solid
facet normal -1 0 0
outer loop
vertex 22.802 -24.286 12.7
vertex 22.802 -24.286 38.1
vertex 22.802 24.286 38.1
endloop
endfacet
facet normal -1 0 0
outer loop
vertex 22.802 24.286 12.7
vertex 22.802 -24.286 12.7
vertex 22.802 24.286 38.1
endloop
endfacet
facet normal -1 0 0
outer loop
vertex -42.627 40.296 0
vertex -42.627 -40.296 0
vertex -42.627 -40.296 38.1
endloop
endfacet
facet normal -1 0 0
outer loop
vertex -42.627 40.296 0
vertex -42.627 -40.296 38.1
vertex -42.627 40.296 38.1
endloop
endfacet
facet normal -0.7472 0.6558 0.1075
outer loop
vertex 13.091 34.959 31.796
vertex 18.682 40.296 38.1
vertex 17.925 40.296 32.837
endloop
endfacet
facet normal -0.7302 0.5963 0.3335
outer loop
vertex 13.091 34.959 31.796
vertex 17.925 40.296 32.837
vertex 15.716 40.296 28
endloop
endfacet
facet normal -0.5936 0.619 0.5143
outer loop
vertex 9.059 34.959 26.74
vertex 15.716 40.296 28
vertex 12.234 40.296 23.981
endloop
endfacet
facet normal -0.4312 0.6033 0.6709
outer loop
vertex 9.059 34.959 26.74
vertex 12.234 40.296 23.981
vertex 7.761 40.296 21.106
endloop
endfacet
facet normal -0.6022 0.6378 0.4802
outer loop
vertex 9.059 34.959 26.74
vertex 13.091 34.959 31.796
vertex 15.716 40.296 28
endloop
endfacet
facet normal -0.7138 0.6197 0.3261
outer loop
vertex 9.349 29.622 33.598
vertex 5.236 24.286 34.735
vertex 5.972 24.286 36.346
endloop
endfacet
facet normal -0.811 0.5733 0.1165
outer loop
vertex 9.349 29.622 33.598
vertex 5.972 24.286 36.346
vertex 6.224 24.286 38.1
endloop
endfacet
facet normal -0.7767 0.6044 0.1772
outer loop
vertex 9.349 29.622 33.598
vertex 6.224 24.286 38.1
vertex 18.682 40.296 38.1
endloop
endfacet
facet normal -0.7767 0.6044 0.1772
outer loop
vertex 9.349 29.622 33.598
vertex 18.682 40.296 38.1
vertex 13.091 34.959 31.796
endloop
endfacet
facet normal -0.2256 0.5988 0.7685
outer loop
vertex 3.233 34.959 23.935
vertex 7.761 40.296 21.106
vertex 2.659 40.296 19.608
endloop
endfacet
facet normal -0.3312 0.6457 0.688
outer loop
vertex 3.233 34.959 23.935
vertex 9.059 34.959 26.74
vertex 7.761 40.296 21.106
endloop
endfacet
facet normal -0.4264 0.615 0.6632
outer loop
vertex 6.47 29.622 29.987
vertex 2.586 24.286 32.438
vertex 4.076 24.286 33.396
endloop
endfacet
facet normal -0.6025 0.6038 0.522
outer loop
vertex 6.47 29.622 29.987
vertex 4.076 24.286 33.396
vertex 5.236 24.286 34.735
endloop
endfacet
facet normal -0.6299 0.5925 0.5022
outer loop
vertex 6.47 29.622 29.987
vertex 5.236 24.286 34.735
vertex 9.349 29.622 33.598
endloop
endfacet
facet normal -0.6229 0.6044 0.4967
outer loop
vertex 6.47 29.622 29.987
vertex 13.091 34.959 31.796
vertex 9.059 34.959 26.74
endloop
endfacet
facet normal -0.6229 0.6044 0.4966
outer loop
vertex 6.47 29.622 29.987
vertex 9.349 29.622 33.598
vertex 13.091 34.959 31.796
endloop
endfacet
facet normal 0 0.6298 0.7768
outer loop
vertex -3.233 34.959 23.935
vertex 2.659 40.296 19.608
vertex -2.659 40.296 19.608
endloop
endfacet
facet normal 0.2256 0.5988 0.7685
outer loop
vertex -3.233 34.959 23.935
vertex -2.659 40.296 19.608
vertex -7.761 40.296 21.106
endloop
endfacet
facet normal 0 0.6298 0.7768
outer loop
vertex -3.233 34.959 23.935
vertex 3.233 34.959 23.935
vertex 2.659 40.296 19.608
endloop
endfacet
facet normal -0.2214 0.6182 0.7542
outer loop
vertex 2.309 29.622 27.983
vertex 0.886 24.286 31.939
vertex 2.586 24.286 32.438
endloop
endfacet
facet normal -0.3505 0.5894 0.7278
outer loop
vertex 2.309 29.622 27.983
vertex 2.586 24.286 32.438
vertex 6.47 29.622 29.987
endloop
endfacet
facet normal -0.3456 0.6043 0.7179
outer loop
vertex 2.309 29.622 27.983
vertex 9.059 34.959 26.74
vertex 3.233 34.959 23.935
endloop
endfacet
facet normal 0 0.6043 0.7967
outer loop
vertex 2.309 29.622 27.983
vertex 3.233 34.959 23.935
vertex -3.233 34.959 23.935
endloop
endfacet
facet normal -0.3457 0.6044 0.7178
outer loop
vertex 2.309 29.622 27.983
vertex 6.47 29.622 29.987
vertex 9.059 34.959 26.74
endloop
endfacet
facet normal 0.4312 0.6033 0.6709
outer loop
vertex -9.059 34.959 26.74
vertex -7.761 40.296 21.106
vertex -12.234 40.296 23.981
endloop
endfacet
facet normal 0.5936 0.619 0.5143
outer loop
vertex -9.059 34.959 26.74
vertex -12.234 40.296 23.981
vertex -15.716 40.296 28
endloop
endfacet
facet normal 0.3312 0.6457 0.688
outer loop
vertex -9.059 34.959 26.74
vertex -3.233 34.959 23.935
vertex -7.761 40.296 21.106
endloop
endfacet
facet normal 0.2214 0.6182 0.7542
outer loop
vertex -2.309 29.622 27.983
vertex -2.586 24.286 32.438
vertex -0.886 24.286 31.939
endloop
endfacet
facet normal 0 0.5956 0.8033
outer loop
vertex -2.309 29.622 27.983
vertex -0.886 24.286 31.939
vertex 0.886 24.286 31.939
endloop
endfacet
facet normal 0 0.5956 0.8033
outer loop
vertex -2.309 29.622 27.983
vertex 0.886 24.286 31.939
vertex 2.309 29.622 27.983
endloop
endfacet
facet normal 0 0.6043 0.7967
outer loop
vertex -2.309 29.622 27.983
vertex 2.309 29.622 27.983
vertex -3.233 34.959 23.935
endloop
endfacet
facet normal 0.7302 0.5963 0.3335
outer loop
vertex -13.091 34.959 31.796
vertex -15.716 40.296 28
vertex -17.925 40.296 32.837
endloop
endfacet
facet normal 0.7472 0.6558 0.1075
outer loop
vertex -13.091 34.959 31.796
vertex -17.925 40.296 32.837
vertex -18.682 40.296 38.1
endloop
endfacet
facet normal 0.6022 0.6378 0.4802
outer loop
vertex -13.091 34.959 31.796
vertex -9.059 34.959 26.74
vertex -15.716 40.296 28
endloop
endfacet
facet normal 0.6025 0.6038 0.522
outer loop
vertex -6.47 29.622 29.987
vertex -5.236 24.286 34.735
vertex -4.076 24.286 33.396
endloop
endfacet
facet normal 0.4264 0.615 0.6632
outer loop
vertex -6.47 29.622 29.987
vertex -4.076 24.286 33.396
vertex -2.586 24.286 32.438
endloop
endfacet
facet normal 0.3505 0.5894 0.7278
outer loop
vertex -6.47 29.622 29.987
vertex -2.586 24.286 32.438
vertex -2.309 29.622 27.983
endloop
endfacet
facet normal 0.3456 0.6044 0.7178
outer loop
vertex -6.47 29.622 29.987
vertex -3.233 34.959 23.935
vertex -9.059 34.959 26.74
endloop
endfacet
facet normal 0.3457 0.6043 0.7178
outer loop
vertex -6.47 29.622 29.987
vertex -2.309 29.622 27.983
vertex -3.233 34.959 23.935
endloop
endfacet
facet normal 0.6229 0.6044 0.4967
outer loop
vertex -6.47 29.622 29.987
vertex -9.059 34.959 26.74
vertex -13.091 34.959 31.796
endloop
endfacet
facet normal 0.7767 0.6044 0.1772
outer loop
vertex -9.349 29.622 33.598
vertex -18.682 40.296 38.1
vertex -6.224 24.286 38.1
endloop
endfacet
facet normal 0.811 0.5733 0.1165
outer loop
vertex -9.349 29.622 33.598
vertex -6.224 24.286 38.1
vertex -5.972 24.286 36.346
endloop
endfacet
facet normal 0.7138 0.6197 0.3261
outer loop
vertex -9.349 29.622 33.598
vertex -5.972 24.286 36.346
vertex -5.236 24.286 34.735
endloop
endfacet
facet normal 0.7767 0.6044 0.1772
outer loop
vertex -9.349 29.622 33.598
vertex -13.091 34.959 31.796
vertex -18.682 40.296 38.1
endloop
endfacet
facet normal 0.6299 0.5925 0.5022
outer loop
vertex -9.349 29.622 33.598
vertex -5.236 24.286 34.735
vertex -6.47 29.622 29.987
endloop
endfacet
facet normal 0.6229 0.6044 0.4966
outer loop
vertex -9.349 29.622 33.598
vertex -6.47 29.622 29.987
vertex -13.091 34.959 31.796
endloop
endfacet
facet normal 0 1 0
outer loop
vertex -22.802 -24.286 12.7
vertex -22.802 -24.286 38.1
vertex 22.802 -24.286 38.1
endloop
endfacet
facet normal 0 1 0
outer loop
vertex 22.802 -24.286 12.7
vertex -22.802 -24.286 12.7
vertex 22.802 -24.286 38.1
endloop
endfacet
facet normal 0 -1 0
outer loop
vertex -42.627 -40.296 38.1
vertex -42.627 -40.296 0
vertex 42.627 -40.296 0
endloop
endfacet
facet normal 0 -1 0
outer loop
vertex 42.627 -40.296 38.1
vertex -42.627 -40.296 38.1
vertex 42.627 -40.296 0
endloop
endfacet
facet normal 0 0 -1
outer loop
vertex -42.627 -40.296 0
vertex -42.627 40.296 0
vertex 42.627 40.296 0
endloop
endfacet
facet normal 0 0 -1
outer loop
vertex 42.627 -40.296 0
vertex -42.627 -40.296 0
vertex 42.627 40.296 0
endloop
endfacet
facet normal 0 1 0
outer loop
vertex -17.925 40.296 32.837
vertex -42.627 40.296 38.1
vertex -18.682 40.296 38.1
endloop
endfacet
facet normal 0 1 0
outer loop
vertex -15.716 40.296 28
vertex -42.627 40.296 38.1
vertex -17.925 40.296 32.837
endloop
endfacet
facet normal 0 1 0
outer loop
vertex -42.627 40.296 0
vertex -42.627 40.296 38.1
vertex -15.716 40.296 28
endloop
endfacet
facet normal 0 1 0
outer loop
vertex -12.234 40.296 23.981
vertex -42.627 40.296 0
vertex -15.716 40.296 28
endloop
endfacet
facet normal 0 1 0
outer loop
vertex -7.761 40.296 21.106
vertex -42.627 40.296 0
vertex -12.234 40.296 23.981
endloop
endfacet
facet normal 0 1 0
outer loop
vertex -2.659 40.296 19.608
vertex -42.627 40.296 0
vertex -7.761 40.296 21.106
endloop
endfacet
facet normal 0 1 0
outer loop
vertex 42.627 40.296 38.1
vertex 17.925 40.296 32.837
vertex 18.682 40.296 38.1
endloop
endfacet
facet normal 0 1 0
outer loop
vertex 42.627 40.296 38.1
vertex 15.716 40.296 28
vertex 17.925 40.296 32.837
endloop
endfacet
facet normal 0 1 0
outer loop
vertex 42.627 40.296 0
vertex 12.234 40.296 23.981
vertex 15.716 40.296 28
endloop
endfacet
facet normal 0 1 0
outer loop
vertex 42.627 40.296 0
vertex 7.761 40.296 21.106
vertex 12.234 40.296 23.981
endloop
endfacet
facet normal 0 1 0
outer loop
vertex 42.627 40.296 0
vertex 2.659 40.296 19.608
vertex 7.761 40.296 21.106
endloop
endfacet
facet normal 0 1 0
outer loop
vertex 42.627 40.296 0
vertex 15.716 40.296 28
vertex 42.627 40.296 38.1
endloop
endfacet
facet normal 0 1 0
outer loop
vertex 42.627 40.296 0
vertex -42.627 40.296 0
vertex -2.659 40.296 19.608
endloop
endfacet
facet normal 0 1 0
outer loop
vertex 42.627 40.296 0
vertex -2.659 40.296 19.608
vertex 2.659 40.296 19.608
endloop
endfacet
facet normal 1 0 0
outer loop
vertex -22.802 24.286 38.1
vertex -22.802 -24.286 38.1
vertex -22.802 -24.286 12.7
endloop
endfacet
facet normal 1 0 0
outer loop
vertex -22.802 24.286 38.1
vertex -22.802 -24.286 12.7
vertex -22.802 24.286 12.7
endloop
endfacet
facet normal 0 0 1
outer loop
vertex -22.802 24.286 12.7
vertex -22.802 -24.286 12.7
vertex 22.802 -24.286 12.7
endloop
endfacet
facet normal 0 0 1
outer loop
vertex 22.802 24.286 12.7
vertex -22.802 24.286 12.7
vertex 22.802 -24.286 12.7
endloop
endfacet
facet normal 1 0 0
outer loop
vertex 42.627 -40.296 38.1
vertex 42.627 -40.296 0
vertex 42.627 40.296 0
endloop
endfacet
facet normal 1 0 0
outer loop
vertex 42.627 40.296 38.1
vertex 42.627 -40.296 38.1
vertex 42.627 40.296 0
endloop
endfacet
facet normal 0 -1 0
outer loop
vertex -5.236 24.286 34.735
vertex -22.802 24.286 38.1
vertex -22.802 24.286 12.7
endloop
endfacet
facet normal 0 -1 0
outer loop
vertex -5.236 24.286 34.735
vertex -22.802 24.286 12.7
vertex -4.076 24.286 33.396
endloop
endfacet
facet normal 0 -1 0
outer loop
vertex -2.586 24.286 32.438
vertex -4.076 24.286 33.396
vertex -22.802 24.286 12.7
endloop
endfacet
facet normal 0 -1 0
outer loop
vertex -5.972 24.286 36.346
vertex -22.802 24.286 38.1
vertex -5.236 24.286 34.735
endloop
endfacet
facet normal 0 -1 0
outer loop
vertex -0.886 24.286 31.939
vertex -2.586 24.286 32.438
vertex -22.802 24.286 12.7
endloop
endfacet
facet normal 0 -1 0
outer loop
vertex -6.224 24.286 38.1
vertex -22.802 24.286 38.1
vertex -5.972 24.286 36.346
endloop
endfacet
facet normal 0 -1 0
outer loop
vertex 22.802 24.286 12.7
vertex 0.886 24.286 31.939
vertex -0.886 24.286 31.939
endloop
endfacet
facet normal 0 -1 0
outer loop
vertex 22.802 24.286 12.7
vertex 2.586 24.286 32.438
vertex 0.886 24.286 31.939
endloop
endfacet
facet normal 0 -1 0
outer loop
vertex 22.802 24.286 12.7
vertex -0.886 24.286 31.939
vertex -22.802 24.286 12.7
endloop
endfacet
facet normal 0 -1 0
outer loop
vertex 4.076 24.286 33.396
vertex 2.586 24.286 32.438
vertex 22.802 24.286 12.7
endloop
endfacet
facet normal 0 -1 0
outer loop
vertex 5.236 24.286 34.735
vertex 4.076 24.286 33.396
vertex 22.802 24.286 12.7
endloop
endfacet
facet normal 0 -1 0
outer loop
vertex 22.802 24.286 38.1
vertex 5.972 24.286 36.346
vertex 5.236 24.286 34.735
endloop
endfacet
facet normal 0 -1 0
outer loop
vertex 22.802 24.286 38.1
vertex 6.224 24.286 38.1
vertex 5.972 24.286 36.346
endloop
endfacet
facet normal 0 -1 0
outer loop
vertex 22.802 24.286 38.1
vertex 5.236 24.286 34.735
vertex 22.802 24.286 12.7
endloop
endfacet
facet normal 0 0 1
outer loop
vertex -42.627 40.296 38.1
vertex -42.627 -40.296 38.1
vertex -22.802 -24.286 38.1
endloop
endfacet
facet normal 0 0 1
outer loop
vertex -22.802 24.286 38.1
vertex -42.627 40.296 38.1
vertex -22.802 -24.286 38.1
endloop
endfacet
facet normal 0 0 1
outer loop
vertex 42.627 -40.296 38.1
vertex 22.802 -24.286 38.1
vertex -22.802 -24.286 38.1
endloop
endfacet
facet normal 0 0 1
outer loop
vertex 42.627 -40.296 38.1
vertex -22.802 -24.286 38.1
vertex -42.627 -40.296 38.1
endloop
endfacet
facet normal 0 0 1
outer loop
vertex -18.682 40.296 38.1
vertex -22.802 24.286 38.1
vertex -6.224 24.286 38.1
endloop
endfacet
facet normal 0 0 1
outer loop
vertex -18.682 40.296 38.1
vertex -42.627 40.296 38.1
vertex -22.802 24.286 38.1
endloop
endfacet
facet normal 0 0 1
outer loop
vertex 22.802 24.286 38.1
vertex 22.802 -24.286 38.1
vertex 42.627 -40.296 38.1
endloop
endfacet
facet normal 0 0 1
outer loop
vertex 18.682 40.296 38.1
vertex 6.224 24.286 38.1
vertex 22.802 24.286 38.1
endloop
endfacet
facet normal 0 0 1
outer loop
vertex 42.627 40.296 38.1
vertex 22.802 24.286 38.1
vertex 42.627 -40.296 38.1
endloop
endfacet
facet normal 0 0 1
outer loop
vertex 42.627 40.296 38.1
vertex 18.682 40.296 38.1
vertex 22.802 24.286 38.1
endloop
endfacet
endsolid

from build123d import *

# Parameters (mm, degrees)
F0_W     = 85.2533727884
F0_H     = 80.5925950408
F1_DEPTH = 38.1
F2_W     = 45.603595674
F2_H     = 48.5711470246
F3_DEPTH = 25.4


with BuildPart() as f1:
    # F0 (on Top) → F1 (new body)
    with BuildSketch(Plane.XY):
        Rectangle(F0_W, F0_H)
    extrude(amount=F1_DEPTH)

    # F2 (on face) → F3 (cut)
    with BuildSketch(Plane.XY.offset(38.1)):
        Rectangle(F2_W, F2_H)
    extrude(amount=-F3_DEPTH, mode=Mode.SUBTRACT)

    # F4 (on face) → F6 section 0
    with BuildSketch(Plane(origin=(0, 40.2962975204, 0), x_dir=(-1, 0, 0), z_dir=(0, 1, 0))):
        with BuildLine():
            Line((18.6819845074, 38.1), (-18.6819845074, 38.1))
            ThreePointArc((-18.6819845074, 38.1), (0, 19.4180154926), (18.6819845074, 38.1))
        make_face()
    # F5 (on face) → F6 section 1
    with BuildSketch(Plane.XZ.offset(-24.2855735123)):
        with BuildLine():
            Line((6.2244155373, 38.1), (-6.2244155373, 38.1))
            ThreePointArc((-6.2244155373, 38.1), (0, 31.8755844627), (6.2244155373, 38.1))
        make_face()
    loft(mode=Mode.SUBTRACT)


solid = f1.part
